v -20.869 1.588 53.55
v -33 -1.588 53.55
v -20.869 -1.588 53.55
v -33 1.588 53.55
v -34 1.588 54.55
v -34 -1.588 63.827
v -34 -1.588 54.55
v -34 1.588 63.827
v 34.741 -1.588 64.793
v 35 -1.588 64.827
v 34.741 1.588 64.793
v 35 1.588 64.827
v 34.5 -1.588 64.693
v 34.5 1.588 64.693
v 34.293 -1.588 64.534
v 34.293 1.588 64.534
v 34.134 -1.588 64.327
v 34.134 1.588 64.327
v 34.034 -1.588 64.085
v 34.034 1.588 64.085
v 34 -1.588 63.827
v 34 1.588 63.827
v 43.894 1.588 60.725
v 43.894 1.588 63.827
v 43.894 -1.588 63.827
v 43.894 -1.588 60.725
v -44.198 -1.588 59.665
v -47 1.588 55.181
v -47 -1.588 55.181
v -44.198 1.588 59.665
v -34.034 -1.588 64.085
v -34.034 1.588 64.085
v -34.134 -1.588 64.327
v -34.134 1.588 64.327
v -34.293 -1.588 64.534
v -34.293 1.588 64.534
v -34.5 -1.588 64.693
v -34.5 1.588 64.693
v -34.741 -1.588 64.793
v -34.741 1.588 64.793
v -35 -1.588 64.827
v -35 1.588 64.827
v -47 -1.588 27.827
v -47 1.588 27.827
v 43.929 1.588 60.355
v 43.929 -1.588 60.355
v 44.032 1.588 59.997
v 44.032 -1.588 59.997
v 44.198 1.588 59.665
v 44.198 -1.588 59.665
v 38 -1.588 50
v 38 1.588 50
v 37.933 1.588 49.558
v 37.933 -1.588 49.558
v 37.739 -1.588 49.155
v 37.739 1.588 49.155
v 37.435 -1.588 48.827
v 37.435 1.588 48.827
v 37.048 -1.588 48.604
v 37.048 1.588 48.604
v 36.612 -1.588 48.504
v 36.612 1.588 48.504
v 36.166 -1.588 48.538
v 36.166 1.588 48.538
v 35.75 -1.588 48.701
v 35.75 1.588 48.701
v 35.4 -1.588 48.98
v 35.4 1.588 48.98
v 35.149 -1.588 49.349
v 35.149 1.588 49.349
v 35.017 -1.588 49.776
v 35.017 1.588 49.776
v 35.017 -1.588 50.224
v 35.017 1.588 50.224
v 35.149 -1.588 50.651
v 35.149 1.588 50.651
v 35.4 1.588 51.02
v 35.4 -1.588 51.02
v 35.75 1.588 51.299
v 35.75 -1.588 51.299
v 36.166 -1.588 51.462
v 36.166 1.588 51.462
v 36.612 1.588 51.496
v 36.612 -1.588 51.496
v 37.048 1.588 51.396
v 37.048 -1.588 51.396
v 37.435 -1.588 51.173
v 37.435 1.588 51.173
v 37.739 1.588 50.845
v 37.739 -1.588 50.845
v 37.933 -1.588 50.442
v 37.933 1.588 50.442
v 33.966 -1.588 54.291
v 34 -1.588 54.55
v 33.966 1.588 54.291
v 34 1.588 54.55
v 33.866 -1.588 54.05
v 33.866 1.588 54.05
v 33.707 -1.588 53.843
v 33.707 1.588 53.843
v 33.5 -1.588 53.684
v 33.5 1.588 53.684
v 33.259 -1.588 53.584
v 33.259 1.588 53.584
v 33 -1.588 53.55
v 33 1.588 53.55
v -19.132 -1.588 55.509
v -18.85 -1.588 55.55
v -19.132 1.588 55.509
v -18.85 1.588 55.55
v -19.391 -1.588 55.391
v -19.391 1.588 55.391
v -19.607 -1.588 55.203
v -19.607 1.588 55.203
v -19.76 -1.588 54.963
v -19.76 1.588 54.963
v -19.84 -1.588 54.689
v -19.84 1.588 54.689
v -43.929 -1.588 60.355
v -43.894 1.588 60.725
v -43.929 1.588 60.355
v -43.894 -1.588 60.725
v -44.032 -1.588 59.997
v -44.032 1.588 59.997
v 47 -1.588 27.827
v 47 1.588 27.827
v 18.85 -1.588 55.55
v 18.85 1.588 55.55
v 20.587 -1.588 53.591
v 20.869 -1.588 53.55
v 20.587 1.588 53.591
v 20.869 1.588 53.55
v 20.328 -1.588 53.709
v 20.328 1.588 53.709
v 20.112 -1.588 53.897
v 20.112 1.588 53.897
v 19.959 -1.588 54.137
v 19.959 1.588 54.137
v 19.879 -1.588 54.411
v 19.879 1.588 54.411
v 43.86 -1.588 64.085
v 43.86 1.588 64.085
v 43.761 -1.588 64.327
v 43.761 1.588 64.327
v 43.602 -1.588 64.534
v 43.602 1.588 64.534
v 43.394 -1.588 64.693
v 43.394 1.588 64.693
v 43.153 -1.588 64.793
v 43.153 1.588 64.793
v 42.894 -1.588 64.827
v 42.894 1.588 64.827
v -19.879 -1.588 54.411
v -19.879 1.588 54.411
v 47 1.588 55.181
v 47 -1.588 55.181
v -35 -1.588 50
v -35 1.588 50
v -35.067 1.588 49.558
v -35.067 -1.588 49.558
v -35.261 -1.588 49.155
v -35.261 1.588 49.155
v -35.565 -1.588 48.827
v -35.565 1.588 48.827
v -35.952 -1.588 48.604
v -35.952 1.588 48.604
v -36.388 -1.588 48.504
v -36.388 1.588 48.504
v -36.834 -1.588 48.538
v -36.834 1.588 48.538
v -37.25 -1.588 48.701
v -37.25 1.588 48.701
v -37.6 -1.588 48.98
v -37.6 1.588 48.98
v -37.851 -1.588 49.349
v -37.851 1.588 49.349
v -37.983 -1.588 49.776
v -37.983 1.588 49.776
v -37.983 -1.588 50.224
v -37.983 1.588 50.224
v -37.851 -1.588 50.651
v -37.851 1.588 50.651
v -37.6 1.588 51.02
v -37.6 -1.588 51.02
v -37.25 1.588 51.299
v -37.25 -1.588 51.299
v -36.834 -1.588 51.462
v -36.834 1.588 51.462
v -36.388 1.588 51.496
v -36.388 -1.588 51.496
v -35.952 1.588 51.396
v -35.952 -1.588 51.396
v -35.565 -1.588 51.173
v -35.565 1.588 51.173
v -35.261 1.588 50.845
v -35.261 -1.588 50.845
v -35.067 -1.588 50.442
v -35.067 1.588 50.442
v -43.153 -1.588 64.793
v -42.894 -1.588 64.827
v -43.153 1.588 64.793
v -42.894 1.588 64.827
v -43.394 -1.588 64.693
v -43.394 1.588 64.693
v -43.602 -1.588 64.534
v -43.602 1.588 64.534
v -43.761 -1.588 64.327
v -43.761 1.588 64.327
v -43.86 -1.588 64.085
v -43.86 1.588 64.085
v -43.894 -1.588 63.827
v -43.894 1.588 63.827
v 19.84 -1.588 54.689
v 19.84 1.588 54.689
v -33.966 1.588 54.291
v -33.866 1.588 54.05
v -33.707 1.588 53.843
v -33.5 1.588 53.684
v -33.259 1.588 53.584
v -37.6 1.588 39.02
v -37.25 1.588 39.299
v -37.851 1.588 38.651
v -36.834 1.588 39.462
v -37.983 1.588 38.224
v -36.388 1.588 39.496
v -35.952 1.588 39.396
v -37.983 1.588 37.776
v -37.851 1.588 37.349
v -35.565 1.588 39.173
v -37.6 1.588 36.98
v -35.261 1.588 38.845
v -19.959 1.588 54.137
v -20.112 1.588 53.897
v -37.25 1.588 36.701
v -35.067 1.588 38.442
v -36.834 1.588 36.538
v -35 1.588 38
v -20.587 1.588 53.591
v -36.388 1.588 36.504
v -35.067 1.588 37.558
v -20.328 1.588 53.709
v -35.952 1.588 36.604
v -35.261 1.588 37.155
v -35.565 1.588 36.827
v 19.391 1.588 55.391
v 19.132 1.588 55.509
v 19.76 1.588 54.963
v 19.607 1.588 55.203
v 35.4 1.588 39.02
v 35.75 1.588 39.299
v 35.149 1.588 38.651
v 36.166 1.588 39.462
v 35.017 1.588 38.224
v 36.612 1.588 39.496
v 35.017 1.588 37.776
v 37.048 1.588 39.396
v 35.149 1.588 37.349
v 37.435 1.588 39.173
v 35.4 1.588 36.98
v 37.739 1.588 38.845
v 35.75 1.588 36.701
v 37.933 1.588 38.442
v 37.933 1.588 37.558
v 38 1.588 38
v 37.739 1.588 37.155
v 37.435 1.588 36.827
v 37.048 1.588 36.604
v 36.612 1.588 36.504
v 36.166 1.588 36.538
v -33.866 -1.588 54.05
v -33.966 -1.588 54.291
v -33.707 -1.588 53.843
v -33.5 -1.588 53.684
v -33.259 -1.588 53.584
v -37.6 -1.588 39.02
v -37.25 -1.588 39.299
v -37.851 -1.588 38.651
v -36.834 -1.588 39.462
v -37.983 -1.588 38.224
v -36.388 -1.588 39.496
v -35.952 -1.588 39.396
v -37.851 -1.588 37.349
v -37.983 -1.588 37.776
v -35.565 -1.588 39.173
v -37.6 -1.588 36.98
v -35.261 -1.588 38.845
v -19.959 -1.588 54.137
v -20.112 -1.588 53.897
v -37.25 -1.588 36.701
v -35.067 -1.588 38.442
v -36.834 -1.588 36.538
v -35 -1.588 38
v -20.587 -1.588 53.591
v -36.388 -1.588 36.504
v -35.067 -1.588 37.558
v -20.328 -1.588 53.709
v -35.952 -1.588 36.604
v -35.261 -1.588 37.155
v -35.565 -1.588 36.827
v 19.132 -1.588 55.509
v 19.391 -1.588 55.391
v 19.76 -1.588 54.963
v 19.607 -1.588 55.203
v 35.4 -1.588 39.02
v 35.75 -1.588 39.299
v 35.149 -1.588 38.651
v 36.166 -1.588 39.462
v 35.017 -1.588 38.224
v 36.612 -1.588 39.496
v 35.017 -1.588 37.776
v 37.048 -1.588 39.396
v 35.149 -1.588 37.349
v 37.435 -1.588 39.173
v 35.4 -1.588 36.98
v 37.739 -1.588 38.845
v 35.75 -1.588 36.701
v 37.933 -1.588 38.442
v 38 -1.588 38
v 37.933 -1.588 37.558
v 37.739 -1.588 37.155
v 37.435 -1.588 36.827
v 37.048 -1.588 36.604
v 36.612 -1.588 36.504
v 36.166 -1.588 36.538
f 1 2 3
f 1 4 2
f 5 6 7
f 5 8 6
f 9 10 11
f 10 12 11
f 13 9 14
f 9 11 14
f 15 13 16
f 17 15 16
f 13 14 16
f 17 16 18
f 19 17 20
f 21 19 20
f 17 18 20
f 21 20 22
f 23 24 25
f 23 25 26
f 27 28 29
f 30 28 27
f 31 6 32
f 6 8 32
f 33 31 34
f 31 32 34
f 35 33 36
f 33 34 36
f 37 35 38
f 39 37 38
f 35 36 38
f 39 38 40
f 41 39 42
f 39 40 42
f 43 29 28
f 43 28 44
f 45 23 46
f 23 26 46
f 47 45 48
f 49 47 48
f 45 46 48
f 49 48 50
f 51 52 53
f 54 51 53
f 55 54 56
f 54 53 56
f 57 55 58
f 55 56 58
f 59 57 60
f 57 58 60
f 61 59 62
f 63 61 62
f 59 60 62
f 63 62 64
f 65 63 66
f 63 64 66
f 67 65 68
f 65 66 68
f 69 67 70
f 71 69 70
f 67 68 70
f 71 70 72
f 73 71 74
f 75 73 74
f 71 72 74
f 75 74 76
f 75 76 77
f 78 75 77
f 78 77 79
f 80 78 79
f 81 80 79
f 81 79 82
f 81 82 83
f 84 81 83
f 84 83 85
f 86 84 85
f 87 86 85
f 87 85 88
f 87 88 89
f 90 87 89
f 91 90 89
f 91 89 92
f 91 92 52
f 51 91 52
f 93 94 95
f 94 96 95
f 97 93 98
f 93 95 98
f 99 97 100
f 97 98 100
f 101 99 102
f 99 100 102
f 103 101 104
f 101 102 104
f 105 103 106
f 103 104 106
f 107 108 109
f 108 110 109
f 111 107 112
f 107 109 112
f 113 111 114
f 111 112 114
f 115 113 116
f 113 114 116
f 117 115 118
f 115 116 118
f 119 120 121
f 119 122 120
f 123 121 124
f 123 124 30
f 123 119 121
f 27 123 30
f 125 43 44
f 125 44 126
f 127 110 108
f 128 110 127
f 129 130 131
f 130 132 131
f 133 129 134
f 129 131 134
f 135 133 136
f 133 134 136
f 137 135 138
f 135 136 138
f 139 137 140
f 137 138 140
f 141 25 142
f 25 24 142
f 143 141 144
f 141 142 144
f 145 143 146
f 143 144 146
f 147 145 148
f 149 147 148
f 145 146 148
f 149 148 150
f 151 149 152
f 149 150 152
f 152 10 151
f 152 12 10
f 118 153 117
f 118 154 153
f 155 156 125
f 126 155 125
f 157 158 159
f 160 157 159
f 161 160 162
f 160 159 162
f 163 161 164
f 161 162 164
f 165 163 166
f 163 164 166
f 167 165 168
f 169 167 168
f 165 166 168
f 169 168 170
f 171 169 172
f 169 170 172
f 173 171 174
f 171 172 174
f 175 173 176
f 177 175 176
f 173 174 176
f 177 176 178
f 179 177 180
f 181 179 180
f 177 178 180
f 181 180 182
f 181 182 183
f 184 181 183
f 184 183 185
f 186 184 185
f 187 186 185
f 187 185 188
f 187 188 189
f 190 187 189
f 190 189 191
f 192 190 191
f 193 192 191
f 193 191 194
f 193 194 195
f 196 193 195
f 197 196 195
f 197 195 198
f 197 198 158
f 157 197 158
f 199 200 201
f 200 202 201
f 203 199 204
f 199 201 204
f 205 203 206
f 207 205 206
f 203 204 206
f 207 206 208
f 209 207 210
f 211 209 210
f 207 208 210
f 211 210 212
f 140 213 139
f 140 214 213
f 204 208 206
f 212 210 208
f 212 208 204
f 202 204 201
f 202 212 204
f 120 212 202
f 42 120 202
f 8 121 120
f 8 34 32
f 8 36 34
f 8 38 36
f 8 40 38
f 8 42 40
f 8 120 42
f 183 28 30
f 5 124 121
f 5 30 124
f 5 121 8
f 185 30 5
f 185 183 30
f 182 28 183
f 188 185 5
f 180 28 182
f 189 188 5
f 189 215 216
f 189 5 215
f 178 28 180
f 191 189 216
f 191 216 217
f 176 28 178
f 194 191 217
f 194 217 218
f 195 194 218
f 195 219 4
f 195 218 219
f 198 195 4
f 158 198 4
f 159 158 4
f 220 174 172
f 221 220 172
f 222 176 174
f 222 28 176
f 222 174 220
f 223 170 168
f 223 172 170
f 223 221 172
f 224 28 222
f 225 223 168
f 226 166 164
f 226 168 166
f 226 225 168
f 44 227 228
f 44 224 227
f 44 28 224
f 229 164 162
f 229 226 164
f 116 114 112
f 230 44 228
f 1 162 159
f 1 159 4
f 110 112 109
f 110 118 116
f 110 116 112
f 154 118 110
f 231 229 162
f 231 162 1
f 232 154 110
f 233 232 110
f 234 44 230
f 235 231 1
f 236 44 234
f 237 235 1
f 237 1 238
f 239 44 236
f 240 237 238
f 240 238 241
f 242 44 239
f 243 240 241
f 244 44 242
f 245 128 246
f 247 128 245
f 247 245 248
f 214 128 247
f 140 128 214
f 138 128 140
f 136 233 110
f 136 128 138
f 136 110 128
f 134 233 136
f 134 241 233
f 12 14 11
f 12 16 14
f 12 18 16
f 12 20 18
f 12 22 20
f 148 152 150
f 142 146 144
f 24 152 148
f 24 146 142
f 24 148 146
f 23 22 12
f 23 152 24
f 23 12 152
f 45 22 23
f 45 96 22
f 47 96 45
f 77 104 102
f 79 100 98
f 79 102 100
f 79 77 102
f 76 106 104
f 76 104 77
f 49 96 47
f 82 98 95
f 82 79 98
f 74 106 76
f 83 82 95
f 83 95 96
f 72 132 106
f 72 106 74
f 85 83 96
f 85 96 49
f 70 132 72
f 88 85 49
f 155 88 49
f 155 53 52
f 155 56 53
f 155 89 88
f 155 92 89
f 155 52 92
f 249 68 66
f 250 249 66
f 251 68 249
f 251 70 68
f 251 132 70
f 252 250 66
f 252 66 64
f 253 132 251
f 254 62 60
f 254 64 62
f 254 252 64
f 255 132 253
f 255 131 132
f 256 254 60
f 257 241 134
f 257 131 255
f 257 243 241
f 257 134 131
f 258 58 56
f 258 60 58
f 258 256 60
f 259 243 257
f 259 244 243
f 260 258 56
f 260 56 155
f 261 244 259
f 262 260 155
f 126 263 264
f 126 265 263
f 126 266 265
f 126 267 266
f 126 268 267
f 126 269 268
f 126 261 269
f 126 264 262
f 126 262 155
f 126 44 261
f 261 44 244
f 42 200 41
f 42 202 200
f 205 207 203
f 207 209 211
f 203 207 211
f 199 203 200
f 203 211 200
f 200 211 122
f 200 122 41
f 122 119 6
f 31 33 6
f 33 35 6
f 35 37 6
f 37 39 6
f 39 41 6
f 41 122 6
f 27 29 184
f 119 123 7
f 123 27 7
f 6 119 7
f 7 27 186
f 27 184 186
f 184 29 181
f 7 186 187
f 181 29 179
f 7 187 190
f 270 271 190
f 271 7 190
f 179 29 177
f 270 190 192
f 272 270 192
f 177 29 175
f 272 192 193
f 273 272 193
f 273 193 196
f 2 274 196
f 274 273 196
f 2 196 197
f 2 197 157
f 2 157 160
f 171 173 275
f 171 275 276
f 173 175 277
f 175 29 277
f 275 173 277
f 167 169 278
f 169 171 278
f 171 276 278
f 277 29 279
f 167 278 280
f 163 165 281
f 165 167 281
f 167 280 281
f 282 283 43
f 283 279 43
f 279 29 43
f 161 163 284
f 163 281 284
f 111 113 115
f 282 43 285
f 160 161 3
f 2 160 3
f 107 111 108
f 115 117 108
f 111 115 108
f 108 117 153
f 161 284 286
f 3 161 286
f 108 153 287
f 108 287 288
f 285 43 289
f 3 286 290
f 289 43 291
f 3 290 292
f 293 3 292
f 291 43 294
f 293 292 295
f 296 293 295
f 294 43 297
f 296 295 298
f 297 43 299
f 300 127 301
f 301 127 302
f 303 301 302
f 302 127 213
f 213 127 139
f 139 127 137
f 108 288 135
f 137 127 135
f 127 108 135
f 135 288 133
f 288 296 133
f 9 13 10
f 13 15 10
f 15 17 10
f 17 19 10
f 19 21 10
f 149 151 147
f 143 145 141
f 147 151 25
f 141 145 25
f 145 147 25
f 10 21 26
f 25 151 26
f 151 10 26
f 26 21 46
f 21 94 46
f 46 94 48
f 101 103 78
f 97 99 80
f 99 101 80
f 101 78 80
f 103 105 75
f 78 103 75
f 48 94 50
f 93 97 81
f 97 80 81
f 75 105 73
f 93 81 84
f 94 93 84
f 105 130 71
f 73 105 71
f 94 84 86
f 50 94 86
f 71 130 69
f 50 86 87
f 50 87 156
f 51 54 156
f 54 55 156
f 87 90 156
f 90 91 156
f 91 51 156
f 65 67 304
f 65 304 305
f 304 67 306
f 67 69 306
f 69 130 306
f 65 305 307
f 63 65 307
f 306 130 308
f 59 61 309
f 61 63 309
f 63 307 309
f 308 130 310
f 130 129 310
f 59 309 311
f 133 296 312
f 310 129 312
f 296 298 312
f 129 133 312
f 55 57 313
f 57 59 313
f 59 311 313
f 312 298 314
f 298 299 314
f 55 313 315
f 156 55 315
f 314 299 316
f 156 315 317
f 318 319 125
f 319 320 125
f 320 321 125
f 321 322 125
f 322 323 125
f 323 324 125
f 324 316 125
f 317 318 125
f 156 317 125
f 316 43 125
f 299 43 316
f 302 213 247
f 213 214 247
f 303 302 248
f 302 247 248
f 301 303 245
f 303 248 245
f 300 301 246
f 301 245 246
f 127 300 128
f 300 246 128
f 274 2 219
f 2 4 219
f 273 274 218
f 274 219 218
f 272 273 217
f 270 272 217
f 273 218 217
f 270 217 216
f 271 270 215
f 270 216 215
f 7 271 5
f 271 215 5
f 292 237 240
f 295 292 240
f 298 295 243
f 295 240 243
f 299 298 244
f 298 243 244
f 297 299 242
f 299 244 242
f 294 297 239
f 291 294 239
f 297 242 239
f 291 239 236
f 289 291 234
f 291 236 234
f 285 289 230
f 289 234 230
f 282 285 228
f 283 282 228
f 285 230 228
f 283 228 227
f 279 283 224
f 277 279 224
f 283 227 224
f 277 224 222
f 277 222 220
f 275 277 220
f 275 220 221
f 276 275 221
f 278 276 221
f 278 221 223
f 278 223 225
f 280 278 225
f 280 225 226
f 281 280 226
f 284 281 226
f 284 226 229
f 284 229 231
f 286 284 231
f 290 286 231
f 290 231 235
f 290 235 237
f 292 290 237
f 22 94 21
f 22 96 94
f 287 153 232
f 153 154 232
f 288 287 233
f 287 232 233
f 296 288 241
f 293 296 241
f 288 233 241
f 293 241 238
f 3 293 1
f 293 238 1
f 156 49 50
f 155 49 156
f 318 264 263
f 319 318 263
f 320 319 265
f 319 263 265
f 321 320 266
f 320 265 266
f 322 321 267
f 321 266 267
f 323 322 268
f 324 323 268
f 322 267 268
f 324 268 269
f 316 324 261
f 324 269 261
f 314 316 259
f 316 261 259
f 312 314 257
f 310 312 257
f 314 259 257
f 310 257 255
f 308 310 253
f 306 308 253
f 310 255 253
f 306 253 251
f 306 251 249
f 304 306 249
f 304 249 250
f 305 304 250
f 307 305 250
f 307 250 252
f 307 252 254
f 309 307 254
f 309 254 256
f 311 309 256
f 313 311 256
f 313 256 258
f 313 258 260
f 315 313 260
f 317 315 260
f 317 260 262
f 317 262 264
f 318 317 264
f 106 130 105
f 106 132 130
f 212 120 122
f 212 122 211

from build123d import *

# Parameters (mm, degrees)
BOSS_EXTRUDE4_DEPTH     = 1.5875
M3_CLEARANCE_HOLE3_D    = 3
M3_CLEARANCE_HOLE1_D    = 3.1
M3_CLEARANCE_HOLE4_D    = 2.95
M3_CLEARANCE_HOLE2_D    = 3.1
BOSS_EXTRUDE6_DEPTH     = 3.175
FILLET1_R               = 2
FILLET3_R               = 1
CUT_EXTRUDE4_DEPTH      = 121.250075508
CUT_EXTRUDE4_DEPTH_BACK = 121.250075508
SKETCH27_OUTSIDE_W      = 217.324
SKETCH27_OUTSIDE_H      = 197.151
SKETCH27_OUTSIDE_W_2    = 94
SKETCH27_OUTSIDE_H_2    = 40


with BuildPart() as part:
    # Sketch1 → Boss-Extrude4 (new, symmetric)
    with BuildSketch(Plane(origin=(0, 0, 0), x_dir=(1, 0, 0), z_dir=(0, 1, 0))):
        with BuildLine():
            Line((-62.799553621, 32.496136604), (-73.969425011, 32.691107434))
            Line((-73.969425011, 32.691107434), (-77.053684287, 35.88495141))
            ThreePointArc((-77.053684287, 35.88495141), (-84.36642289, 10.358894189), (-83.446216027, -16.178041625))
            Line((-83.446216027, -16.178041625), (-79.680911643, -13.825218315))
            Line((-79.680911643, -13.825218315), (-69.484649137, -16.179210996))
            Line((-69.484649137, -16.179210996), (-43.894490772, -57.132025032))
            Line((-43.894490772, -57.132025032), (-43.894490772, -64.826600275))
            Line((-43.894490772, -64.826600275), (-43.094490772, -64.826600275))
            Line((-43.094490772, -64.826600275), (-34, -64.826600275))
            Line((-34, -64.826600275), (-34, -55.55))
            Line((-34, -55.55), (-34, -53.55))
            Line((-34, -53.55), (-20, -53.55))
            Line((-20, -53.55), (-19.718918331, -55.55))
            Line((-19.718918331, -55.55), (19.718918331, -55.55))
            Line((19.718918331, -55.55), (20, -53.55))
            Line((20, -53.55), (34, -53.55))
            Line((34, -53.55), (34, -55.55))
            Line((34, -55.55), (34, -64.826600275))
            Line((34, -64.826600275), (43.094490772, -64.826600275))
            Line((43.094490772, -64.826600275), (43.894490772, -64.826600275))
            Line((43.894490772, -64.826600275), (43.894490772, -57.132025032))
            Line((43.894490772, -57.132025032), (69.484649137, -16.179210996))
            Line((69.484649137, -16.179210996), (79.680911643, -13.825218315))
            Line((79.680911643, -13.825218315), (83.446216027, -16.178041625))
            ThreePointArc((83.446216027, -16.178041625), (84.610662337, -8.126242604), (85, 0))
            ThreePointArc((85, 0), (82.98964744, 18.377116688), (77.053684287, 35.88495141))
            Line((77.053684287, 35.88495141), (73.969425011, 32.691107434))
            Line((73.969425011, 32.691107434), (62.799553621, 32.496136604))
            Line((62.799553621, 32.496136604), (30.284668021, 63.895396642))
            Line((30.284668021, 63.895396642), (30.089697191, 75.065268032))
            Line((30.089697191, 75.065268032), (33.173956467, 78.259112008))
            ThreePointArc((33.173956467, 78.259112008), (0, 85), (-33.173956467, 78.259112008))
            Line((-33.173956467, 78.259112008), (-30.089697191, 75.065268032))
            Line((-30.089697191, 75.065268032), (-30.284668021, 63.895396642))
            Line((-30.284668021, 63.895396642), (-62.799553621, 32.496136604))
        make_face()
    extrude(amount=BOSS_EXTRUDE4_DEPTH, both=True)

    # M3 Clearance Hole3 (through all)
    with Locations(Plane(origin=(0, -1.5875, 0), x_dir=(-1, 0, 0), z_dir=(0, -1, 0))):
        with Locations((36.5, -50), (36.5, -38), (-36.5, -50), (-36.5, -38)):
            Hole(M3_CLEARANCE_HOLE3_D / 2)

    # M3 Clearance Hole1 (through all)
    with Locations(Plane(origin=(0, 1.5875, 0), x_dir=(1, 0, 0), z_dir=(0, 1, 0))):
        with Locations((-78.542321426, -8.49139241), (78.542321426, -8.49139241), (74.155025063, 27.240269049), (-74.155025063, 27.240269049)):
            Hole(M3_CLEARANCE_HOLE1_D / 2)

    # M3 Clearance Hole4 (through all)
    with Locations(Plane(origin=(0, -1.5875, 0), x_dir=(-1, 0, 0), z_dir=(0, -1, 0))):
        with Locations((-67.099301622, -15.278865202), (-50.141885166, -42.416404279), (-61.062544382, 30.698137949), (-38.043670771, 52.927205804), (50.141885166, -42.416404279), (67.099301622, -15.278865202), (38.043670771, 52.927205804), (61.062544382, 30.698137949)):
            Hole(M3_CLEARANCE_HOLE4_D / 2)

    # M3 Clearance Hole2 (through all)
    with Locations(Plane(origin=(0, 1.5875, 0), x_dir=(1, 0, 0), z_dir=(0, 1, 0))):
        with Locations((27, 76.497766718), (-27, 76.497766718)):
            Hole(M3_CLEARANCE_HOLE2_D / 2)

    # Sketch22 → Boss-Extrude6 (add)
    with BuildSketch(Plane(origin=(0, 1.5875, 0), x_dir=(1, 0, 0), z_dir=(0, 1, 0))):
        Polygon((65.061950694, 32.535626892), (30.245177733, 66.157793715), (30.284668021, 63.895396642), (62.799553621, 32.496136604), align=None)
        Polygon((-30.284668021, 63.895396642), (-30.245177733, 66.157793715), (-65.061950694, 32.535626892), (-62.799553621, 32.496136604), align=None)
        Polygon((43.894490772, -60.151352895), (71.689396914, -15.670204865), (69.484649137, -16.179210996), (43.894490772, -57.132025032), align=None)
        Polygon((-69.484649137, -16.179210996), (-71.689396914, -15.670204865), (-43.894490772, -60.151352895), (-43.894490772, -57.132025032), align=None)
    extrude(amount=-BOSS_EXTRUDE6_DEPTH)

    # Fillet1
    fillet1_edges = [part.edges().sort_by_distance(p)[0] for p in [
        (-30.245177733, -0.79375, -66.157793715),
        (-65.061950694, -0.79375, -32.535626892),
        (-71.689396914, -0.79375, 15.670204865),
        (-43.894490772, -0.79375, 60.151352895),
        (43.894490772, 0.79375, 60.151352895),
        (71.689396914, 0.79375, 15.670204865),
        (65.061950694, -0.79375, -32.535626892),
        (30.245177733, 0.79375, -66.157793715),
        (30.089697191, -0.79375, -75.065268032),
        (73.969425011, -0.79375, -32.691107434),
        (79.680911643, -0.79375, 13.825218315),
        (-79.680911643, -0.79375, 13.825218315),
        (-73.969425011, -0.79375, -32.691107434),
        (-30.089697191, -0.79375, -75.065268032),
    ]]
    fillet(fillet1_edges, radius=FILLET1_R)

    # Fillet3
    fillet3_edges = [part.edges().sort_by_distance(p)[0] for p in [
        (33.173956467, -0.79375, -78.259112008),
        (77.053684287, 0.79375, -35.88495141),
        (83.446216027, -0.79375, 16.178041625),
        (43.894490772, -0.79375, 64.826600275),
        (34, 0.79375, 64.826600275),
        (34, -0.79375, 53.55),
        (20, -0.79375, 53.55),
        (19.718918331, 0.79375, 55.55),
        (-19.718918331, 0.79375, 55.55),
        (-20, -0.79375, 53.55),
        (-34, -0.79375, 53.55),
        (-34, 0.79375, 64.826600275),
        (-43.894490772, -0.79375, 64.826600275),
        (-83.446216027, -0.79375, 16.178041625),
        (-77.053684287, -0.79375, -35.88495141),
        (-33.173956467, -0.79375, -78.259112008),
    ]]
    fillet(fillet3_edges, radius=FILLET3_R)

    # Sketch27 outside → Cut-Extrude4 (cut, two sides: drawn at the far end of the back side and taken through both)
    with BuildSketch(Plane(origin=(0, 1.5875, 0), x_dir=(1, 0, 0), z_dir=(0, 1, 0)).offset(-CUT_EXTRUDE4_DEPTH_BACK)):
        with Locations((0, 10.0865)):
            Rectangle(SKETCH27_OUTSIDE_W, SKETCH27_OUTSIDE_H)
        with Locations((0, -47.826600275)):
            Rectangle(SKETCH27_OUTSIDE_W_2, SKETCH27_OUTSIDE_H_2, mode=Mode.SUBTRACT)
    extrude(amount=CUT_EXTRUDE4_DEPTH + CUT_EXTRUDE4_DEPTH_BACK, mode=Mode.SUBTRACT)


solid = part.part
